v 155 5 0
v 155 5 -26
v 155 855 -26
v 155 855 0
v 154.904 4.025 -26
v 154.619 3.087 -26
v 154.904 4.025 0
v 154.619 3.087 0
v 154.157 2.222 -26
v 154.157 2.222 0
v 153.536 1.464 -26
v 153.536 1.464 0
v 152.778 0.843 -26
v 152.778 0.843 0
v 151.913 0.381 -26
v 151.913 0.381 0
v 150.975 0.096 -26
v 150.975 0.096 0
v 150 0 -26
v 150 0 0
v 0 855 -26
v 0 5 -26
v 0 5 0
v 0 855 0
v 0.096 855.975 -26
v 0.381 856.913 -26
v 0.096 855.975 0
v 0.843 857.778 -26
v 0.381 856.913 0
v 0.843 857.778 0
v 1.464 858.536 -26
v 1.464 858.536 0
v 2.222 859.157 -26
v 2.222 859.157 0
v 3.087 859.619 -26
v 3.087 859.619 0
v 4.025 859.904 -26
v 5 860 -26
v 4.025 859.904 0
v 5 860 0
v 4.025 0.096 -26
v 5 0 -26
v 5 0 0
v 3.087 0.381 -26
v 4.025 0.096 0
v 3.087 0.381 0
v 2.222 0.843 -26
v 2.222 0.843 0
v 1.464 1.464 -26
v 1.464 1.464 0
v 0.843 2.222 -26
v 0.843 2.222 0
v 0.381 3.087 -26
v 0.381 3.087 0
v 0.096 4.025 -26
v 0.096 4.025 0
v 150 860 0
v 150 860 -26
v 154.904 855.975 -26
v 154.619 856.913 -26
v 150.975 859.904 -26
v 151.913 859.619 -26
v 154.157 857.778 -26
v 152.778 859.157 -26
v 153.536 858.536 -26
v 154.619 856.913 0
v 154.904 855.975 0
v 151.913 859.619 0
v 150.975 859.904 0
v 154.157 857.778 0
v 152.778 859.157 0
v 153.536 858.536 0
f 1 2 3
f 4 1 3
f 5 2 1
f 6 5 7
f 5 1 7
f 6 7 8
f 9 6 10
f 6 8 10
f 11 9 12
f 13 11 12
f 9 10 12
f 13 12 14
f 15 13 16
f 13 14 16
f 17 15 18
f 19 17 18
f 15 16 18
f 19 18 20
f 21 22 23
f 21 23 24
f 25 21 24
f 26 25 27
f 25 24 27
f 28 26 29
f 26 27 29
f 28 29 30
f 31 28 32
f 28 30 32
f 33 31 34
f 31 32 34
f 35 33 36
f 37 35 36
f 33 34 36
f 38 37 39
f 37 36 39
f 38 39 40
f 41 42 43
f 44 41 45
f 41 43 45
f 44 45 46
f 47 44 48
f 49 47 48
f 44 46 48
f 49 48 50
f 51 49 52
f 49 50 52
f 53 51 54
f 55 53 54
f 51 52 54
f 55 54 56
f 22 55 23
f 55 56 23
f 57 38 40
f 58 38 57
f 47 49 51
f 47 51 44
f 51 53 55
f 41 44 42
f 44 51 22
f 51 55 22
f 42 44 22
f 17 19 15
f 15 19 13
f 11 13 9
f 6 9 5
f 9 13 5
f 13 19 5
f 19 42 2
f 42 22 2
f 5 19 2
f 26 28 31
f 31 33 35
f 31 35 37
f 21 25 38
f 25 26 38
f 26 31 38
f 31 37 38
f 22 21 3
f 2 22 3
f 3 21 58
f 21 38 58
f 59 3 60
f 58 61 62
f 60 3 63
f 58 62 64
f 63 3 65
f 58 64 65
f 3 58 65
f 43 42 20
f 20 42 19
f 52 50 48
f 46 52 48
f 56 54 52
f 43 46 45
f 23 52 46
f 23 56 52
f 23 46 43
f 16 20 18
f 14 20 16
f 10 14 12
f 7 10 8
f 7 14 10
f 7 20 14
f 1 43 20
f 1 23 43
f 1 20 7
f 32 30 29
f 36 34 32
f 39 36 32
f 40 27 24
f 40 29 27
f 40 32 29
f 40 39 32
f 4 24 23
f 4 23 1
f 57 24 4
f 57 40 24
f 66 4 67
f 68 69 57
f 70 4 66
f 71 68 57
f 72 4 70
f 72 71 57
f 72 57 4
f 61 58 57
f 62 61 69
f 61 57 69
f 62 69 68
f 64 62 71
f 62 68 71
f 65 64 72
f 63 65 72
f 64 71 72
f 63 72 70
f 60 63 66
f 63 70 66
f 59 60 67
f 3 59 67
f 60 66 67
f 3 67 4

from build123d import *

# Parameters (mm, degrees)
SKETCH1_W           = 155
SKETCH1_H           = 860
BOSS_EXTRUDE1_DEPTH = 26
FILLET1_R           = 5
FILLET2_R           = 5
FILLET3_R           = 5
FILLET4_R           = 5


with BuildPart() as part:
    # Sketch1 → Boss-Extrude1 (new body)
    with BuildSketch(Plane.XY):
        with Locations((77.5, 430)):
            Rectangle(SKETCH1_W, SKETCH1_H)
    extrude(amount=BOSS_EXTRUDE1_DEPTH)

    # Fillet1
    fillet1_edges = [part.edges().sort_by_distance(p)[0] for p in [
        (0, 860, 13),
    ]]
    fillet(fillet1_edges, radius=FILLET1_R)

    # Fillet2
    fillet2_edges = [part.edges().sort_by_distance(p)[0] for p in [
        (155, 860, 13),
    ]]
    fillet(fillet2_edges, radius=FILLET2_R)

    # Fillet3
    fillet3_edges = [part.edges().sort_by_distance(p)[0] for p in [
        (155, 0, 13),
    ]]
    fillet(fillet3_edges, radius=FILLET3_R)

    # Fillet4
    fillet4_edges = [part.edges().sort_by_distance(p)[0] for p in [
        (0, 0, 13),
    ]]
    fillet(fillet4_edges, radius=FILLET4_R)


with BuildPart() as part_1:
    # Body-Move/Copy1: moved
    add(part.part.moved(Location((0, 0, -19.05))))


with BuildPart() as part_2:
    # Body-Move/Copy2: moved
    add(part_1.part.moved(Location((0, 0, -6.95))))


solid = part_2.part
